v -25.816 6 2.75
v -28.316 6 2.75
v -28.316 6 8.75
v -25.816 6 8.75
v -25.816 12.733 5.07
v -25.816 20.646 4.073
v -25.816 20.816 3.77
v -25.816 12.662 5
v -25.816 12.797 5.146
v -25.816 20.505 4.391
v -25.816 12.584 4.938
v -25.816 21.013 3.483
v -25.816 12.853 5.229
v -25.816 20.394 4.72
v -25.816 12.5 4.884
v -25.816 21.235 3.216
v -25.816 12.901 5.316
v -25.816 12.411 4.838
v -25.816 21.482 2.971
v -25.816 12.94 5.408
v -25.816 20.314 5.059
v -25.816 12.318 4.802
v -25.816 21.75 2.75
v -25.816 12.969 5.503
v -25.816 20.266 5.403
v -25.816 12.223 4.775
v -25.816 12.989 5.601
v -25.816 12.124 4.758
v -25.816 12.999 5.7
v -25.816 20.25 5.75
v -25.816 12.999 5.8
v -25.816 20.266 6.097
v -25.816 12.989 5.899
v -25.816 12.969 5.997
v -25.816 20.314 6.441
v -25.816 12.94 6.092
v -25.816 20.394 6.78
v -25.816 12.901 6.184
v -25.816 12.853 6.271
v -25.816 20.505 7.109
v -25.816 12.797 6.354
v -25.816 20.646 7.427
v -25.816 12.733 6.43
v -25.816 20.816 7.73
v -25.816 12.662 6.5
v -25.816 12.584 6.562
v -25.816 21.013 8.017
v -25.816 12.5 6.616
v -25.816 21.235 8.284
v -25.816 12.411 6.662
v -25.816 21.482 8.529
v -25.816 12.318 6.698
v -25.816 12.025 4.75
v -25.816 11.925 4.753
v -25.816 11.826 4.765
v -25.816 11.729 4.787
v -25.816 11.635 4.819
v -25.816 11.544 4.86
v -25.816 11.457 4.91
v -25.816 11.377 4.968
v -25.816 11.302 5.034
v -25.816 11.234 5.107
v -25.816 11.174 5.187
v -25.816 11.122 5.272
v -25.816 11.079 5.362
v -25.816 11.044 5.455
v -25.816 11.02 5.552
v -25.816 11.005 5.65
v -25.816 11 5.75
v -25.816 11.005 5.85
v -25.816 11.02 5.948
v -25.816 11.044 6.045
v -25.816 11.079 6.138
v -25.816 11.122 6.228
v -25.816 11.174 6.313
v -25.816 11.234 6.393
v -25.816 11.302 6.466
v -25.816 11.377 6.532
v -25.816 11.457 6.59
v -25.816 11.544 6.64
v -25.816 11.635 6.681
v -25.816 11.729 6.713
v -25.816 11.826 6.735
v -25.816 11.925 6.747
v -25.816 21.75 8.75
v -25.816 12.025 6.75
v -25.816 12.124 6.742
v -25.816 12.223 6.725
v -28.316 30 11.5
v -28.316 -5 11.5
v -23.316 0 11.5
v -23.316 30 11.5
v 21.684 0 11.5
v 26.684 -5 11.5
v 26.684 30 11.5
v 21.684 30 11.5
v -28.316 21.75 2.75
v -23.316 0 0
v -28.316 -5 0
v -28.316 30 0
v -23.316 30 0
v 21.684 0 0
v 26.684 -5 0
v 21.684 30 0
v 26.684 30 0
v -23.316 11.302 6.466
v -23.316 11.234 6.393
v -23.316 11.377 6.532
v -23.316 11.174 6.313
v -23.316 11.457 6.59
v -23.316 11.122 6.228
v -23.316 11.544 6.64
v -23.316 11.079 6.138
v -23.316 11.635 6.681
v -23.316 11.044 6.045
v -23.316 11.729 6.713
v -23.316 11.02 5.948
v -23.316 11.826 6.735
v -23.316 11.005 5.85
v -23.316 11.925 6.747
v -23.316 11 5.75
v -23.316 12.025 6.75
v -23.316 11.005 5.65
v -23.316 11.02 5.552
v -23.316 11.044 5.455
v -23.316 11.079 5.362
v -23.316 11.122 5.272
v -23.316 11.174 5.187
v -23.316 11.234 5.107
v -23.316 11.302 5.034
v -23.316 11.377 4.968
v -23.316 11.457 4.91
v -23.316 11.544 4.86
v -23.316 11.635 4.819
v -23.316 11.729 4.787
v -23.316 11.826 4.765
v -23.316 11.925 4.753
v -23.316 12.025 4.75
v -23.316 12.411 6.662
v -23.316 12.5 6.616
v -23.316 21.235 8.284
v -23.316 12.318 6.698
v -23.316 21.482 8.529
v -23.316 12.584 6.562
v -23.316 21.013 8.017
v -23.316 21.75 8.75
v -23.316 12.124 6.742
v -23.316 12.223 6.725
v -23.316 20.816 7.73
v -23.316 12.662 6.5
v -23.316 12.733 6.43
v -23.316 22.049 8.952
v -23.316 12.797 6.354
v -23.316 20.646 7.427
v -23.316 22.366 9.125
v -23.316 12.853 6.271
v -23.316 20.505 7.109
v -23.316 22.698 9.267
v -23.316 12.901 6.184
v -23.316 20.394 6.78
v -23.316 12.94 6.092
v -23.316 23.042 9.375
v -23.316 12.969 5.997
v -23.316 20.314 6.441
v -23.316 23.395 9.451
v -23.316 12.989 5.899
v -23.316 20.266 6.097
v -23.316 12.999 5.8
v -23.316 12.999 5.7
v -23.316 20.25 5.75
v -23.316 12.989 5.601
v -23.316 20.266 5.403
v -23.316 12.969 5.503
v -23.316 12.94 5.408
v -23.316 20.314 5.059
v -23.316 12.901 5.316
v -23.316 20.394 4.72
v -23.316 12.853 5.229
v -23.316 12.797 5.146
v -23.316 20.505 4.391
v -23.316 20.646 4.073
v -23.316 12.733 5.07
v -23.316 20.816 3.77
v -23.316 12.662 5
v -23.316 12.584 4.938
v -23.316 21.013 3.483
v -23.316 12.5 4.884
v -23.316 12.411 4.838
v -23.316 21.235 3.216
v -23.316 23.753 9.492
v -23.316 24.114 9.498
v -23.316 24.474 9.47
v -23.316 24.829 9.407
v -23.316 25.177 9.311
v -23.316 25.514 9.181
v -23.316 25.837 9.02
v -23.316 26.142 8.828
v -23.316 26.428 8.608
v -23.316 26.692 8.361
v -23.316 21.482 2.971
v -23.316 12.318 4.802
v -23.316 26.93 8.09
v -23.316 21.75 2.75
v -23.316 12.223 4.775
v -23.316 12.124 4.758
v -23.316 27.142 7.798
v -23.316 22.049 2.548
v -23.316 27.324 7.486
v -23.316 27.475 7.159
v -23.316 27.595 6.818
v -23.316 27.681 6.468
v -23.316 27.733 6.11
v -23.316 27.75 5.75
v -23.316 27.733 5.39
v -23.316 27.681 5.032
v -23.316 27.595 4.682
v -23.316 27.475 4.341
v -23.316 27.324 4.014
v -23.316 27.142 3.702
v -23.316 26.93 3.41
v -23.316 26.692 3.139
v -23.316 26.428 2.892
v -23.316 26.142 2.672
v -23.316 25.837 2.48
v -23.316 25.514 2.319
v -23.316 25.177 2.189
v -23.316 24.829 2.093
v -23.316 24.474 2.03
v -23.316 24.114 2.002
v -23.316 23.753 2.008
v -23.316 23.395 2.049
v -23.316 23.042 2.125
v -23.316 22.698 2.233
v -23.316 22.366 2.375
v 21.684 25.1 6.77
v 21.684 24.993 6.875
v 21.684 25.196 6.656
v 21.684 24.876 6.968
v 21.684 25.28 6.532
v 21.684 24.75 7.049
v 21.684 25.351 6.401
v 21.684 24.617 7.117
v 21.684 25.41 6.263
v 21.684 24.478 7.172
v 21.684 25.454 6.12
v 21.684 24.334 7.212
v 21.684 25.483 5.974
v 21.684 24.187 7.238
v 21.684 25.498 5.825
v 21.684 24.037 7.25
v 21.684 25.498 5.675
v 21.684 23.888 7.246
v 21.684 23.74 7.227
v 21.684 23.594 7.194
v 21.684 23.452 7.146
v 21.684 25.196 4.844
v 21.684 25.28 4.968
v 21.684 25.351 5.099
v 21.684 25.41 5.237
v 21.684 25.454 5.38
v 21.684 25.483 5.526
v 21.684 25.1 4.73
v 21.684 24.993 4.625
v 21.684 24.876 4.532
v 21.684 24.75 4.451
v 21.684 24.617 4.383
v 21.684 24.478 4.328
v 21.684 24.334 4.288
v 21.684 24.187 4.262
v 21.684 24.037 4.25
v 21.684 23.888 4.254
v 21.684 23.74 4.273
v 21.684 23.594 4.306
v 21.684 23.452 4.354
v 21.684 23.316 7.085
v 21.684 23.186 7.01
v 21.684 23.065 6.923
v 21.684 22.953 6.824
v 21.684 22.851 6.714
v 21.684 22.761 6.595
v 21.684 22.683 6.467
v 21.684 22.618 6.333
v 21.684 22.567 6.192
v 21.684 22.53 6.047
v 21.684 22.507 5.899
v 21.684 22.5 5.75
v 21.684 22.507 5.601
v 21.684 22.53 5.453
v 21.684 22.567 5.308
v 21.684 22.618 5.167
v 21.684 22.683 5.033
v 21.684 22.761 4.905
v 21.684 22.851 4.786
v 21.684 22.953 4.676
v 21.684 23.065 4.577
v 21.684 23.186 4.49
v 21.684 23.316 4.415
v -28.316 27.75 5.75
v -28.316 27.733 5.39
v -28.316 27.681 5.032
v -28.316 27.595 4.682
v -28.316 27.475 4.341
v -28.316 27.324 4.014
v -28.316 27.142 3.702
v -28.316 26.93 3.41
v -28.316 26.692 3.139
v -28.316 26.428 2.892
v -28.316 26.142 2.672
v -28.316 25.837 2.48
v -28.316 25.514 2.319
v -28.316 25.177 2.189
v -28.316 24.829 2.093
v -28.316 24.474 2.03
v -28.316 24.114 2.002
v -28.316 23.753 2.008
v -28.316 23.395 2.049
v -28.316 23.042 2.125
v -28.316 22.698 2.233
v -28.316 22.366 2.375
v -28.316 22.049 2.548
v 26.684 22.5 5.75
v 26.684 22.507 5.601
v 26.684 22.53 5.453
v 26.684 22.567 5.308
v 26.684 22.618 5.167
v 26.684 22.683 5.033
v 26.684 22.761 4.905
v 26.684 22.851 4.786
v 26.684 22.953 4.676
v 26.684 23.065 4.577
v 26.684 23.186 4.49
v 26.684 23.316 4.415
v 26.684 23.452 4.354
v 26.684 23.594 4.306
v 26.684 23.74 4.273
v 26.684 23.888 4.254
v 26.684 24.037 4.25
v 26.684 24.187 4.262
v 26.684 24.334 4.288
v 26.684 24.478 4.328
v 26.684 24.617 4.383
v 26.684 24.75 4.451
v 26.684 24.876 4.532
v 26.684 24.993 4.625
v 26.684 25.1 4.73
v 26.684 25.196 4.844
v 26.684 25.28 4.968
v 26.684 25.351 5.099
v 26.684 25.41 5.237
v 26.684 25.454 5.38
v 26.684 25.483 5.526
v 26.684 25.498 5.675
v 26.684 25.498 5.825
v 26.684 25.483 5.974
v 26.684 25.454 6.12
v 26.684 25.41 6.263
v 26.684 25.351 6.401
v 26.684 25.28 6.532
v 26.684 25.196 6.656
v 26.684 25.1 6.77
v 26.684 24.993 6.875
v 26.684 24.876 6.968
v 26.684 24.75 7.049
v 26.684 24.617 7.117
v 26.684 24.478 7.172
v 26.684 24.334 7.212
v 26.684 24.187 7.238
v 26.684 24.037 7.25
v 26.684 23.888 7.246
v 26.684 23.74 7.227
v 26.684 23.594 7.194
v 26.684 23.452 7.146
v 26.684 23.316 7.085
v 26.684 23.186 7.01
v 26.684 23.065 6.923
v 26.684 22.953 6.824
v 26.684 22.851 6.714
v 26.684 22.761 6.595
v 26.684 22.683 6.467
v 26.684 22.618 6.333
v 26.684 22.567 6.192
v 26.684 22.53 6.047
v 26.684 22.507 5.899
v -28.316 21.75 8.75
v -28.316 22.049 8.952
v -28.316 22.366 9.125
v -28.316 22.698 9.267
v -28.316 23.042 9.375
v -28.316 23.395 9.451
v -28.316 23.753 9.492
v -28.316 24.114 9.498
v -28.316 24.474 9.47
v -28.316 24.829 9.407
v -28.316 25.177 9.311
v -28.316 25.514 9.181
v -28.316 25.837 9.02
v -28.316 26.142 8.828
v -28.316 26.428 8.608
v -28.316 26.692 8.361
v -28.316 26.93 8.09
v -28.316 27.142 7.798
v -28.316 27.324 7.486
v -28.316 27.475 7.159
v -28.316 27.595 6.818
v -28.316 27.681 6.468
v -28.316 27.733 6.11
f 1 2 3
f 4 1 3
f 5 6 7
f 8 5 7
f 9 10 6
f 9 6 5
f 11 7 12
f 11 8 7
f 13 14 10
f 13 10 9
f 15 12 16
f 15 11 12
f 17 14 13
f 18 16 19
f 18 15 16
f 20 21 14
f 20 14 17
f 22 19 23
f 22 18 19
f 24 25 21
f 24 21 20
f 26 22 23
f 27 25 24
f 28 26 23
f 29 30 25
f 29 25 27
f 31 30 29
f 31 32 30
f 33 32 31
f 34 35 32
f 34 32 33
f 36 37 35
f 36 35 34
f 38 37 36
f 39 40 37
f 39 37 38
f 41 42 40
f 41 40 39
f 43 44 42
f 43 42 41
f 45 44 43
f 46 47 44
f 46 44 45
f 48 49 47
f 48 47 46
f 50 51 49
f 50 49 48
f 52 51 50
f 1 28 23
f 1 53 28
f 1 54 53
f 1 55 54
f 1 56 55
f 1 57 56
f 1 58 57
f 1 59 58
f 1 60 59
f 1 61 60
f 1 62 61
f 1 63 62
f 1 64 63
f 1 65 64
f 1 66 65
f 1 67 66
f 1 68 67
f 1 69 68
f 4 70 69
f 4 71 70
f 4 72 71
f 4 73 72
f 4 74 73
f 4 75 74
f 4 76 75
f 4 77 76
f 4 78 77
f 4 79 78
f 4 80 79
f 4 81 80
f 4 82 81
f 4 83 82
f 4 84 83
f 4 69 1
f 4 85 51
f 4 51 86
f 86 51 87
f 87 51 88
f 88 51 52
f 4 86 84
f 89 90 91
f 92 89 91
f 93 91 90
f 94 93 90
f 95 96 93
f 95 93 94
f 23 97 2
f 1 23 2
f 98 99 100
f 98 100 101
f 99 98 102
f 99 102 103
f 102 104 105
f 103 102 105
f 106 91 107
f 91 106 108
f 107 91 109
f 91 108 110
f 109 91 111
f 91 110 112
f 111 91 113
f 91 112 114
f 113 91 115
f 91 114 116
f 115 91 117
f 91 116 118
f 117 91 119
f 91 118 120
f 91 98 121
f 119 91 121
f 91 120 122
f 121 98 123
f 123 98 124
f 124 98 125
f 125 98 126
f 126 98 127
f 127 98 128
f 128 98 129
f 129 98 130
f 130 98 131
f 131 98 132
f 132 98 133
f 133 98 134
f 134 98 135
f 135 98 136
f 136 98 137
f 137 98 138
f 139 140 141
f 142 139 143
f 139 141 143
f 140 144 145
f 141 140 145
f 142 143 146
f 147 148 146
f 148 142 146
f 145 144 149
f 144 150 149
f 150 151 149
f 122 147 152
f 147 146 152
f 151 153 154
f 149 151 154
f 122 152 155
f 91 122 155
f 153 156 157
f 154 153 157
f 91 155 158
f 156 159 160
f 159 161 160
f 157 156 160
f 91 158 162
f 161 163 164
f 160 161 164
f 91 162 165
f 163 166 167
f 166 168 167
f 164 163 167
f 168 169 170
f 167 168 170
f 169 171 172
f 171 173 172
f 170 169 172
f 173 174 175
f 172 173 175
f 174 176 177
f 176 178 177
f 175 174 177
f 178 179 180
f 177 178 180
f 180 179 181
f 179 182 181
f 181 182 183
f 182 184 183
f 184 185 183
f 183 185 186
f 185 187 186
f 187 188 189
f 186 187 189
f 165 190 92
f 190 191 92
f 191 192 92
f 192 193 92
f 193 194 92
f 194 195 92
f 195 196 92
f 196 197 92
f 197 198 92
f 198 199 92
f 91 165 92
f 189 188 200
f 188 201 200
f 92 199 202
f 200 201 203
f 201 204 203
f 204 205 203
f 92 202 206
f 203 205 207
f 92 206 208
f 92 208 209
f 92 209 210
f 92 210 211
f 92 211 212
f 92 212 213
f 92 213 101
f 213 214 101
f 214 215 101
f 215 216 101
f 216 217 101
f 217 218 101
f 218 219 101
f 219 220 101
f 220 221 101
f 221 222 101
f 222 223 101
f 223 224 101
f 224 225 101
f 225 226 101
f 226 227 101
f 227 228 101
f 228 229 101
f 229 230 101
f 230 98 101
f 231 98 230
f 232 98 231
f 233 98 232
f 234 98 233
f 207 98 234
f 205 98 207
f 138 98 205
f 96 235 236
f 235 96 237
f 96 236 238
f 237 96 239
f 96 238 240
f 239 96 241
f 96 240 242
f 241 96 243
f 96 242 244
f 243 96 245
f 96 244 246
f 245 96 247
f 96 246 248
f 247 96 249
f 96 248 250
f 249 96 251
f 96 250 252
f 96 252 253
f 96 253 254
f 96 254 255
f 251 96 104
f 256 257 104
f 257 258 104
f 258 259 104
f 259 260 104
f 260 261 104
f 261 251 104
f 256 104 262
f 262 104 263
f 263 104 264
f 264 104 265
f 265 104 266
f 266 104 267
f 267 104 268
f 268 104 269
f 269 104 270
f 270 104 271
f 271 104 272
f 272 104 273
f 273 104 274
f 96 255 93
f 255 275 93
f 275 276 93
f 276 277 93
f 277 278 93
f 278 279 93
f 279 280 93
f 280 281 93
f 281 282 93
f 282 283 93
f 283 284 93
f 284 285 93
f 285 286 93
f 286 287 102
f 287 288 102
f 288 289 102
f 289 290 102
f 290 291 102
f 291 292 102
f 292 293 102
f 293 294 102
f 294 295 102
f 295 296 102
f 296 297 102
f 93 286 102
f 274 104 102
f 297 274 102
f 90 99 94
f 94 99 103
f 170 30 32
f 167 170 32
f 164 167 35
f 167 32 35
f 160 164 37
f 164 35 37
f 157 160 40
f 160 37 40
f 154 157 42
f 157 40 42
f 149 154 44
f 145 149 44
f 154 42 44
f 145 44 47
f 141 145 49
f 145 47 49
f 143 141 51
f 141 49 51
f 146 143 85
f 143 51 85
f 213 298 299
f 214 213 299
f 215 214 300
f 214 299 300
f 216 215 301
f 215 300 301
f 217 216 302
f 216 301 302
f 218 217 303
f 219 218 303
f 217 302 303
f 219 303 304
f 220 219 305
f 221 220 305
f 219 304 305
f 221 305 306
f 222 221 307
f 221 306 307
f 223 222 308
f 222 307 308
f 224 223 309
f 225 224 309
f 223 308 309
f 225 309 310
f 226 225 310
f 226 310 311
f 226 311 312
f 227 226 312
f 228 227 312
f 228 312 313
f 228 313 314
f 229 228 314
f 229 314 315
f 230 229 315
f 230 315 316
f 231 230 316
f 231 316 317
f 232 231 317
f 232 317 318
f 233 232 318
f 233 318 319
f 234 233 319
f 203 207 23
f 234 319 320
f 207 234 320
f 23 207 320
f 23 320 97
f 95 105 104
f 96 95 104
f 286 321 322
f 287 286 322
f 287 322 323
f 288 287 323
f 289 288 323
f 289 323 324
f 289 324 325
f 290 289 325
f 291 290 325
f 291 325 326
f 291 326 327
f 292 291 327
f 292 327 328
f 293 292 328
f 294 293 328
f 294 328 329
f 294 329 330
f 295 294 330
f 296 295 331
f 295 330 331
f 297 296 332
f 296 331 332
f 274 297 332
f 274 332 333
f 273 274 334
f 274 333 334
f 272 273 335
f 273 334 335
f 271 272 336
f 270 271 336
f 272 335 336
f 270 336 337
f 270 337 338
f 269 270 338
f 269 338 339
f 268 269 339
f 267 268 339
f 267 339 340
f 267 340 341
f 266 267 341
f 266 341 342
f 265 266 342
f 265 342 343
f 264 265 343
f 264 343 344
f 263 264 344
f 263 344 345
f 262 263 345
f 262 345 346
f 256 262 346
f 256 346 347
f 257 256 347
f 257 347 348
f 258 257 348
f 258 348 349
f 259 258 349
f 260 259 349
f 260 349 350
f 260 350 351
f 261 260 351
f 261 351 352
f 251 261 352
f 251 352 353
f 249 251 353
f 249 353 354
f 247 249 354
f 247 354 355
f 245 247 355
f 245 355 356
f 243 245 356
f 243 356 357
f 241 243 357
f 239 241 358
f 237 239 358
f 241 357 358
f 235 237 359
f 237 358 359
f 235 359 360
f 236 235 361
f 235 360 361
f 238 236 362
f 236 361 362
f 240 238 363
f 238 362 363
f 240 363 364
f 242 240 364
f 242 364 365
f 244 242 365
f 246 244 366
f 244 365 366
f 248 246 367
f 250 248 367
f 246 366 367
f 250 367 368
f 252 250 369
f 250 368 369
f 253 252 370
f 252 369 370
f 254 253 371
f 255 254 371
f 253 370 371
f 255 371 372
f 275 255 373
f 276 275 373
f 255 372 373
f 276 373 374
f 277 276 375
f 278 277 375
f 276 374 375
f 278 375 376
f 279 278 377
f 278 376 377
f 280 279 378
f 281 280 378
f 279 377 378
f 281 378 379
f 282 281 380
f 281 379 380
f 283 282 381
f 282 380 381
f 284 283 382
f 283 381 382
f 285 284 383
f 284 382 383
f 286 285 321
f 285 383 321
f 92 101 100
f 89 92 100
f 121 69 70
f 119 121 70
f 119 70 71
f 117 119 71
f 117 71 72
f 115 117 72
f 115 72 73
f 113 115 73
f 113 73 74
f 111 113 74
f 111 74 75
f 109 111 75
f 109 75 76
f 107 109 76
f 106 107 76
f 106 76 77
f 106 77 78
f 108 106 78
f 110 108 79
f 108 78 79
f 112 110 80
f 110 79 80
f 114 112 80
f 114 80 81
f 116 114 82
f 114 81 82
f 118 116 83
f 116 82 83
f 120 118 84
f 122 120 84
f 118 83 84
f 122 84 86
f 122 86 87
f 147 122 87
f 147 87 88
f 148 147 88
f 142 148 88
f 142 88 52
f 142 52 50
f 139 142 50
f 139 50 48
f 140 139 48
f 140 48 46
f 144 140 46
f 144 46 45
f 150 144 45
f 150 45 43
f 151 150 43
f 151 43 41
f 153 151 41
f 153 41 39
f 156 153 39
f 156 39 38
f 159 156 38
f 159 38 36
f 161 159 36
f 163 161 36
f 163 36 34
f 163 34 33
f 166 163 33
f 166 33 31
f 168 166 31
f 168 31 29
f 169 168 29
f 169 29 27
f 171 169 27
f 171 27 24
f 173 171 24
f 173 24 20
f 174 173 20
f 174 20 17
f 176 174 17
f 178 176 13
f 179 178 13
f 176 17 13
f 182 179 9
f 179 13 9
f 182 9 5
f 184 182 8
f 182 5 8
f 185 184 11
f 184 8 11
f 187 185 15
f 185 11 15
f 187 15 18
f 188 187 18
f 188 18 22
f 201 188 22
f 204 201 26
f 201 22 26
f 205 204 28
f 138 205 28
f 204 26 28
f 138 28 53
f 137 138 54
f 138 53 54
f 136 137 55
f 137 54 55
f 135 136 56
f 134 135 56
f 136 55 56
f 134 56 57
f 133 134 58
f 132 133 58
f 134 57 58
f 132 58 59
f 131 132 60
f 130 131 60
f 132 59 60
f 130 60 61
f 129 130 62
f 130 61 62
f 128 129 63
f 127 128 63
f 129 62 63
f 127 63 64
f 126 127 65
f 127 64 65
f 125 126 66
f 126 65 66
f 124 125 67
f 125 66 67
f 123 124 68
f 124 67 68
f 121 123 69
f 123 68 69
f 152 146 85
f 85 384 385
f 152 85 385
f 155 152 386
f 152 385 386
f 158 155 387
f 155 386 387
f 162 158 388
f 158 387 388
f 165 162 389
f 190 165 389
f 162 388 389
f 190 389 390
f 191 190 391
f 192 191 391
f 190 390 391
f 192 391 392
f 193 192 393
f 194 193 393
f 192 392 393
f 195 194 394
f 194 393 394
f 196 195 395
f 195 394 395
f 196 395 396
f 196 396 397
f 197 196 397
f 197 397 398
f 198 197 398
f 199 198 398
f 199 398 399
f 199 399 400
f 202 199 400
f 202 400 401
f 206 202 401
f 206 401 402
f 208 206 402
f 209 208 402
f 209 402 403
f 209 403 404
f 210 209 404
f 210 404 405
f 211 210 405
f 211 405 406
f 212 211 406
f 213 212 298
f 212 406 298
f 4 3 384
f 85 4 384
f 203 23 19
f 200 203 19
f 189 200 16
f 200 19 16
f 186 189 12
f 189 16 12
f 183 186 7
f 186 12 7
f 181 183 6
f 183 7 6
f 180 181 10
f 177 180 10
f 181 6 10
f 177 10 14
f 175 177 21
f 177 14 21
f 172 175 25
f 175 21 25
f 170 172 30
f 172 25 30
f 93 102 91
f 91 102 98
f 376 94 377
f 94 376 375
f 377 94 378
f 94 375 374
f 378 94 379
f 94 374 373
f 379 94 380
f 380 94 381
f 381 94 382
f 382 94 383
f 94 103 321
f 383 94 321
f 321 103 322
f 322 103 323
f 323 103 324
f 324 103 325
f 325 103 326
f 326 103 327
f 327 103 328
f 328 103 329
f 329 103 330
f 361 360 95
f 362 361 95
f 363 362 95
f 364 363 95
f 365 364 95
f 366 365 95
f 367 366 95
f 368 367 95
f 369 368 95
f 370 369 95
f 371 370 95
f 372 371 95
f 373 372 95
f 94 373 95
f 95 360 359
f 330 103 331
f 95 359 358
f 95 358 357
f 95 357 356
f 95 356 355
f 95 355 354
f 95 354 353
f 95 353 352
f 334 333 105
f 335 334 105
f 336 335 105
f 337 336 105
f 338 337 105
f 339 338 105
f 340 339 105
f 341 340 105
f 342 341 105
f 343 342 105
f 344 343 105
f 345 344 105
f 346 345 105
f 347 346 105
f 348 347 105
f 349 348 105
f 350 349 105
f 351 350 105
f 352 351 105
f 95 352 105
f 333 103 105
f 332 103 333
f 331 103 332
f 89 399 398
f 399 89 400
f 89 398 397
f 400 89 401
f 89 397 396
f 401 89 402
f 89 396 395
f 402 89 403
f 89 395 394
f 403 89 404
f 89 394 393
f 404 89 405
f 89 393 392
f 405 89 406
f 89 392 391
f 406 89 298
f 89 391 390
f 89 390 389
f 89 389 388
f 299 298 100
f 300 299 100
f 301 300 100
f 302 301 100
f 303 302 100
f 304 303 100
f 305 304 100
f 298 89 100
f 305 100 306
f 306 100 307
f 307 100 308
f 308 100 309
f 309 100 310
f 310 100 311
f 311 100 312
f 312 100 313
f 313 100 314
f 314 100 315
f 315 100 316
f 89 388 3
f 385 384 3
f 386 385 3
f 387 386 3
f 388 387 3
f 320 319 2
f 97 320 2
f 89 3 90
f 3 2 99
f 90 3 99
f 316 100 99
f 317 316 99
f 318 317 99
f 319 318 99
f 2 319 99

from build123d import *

# Parameters (mm, degrees)
F1_DEPTH = 11.5
F3_DEPTH = 25
F4_DEPTH = 2.5
F6_DEPTH = 25


with BuildPart() as f1:
    # F0 (on Top) → F1 (new body)
    with BuildSketch(Plane.XY):
        Polygon((21.6838430613, 0), (-23.3161569387, 0), (-23.3161569387, 30), (-28.3161569387, 30), (-28.3161569387, -5), (26.6838430613, -5), (26.6838430613, 30), (21.6838430613, 30), align=None)
    extrude(amount=F1_DEPTH)

    # F2 (on face) → F3 (cut)
    with BuildSketch(Plane(origin=(-28.3161569387, 0, 0), x_dir=(0, -1, 0), z_dir=(-1, 0, 0))):
        with BuildLine():
            ThreePointArc((-21.75, 2.75), (-20.6458980338, 4.0729490169), (-20.25, 5.75))
            Line((-20.25, 5.75), (-24.0342449397, 5.75))
            Line((-24.0342449397, 5.75), (-24.0342449397, 2.75))
            Line((-24.0342449397, 2.75), (-21.75, 2.75))
        make_face()
        with BuildLine():
            Line((-24.0342449397, 5.75), (-20.25, 5.75))
            ThreePointArc((-20.25, 5.75), (-20.6458980338, 7.4270509831), (-21.75, 8.75))
            Line((-21.75, 8.75), (-24.0342449397, 8.75))
            Line((-24.0342449397, 8.75), (-24.0342449397, 5.75))
        make_face()
        with BuildLine():
            Line((-24.0342449397, 8.75), (-21.75, 8.75))
            ThreePointArc((-21.75, 8.75), (-25.6770509831, 9.1041019662), (-27.75, 5.75))
            Line((-27.75, 5.75), (-24.0342449397, 5.75))
            Line((-24.0342449397, 5.75), (-24.0342449397, 8.75))
        make_face()
        with BuildLine():
            ThreePointArc((-27.75, 5.75), (-25.6770509831, 2.3958980338), (-21.75, 2.75))
            Line((-21.75, 2.75), (-24.0342449397, 2.75))
            Line((-24.0342449397, 2.75), (-24.0342449397, 5.75))
            Line((-24.0342449397, 5.75), (-27.75, 5.75))
        make_face()
        with BuildLine():
            ThreePointArc((-13, 5.75), (-12, 4.75), (-11, 5.75))
            Line((-11, 5.75), (-13, 5.75))
        make_face()
        with BuildLine():
            Line((-13, 5.75), (-11, 5.75))
            ThreePointArc((-11, 5.75), (-12, 6.75), (-13, 5.75))
        make_face()
    extrude(amount=-F3_DEPTH, mode=Mode.SUBTRACT)

    # F2 (on face) → F4 (cut)
    with BuildSketch(Plane(origin=(-28.3161569387, 0, 0), x_dir=(0, -1, 0), z_dir=(-1, 0, 0))):
        with BuildLine():
            Line((-6, 5.75), (-11, 5.75))
            ThreePointArc((-11, 5.75), (-12, 4.75), (-13, 5.75))
            Line((-13, 5.75), (-20.25, 5.75))
            ThreePointArc((-20.25, 5.75), (-20.6458980338, 4.0729490169), (-21.75, 2.75))
            Line((-21.75, 2.75), (-6, 2.75))
            Line((-6, 2.75), (-6, 5.75))
        make_face()
        with BuildLine():
            ThreePointArc((-13, 5.75), (-12, 6.75), (-11, 5.75))
            Line((-11, 5.75), (-6, 5.75))
            Line((-6, 5.75), (-6, 8.75))
            Line((-6, 8.75), (-21.75, 8.75))
            ThreePointArc((-21.75, 8.75), (-20.6458980338, 7.4270509831), (-20.25, 5.75))
            Line((-20.25, 5.75), (-13, 5.75))
        make_face()
    extrude(amount=-F4_DEPTH, mode=Mode.SUBTRACT)

    # F5 (on face) → F6 (cut)
    with BuildSketch(Plane.YZ.offset(26.6838430613)):
        with BuildLine():
            Line((22.5, 5.75), (25.5, 5.75))
            ThreePointArc((25.5, 5.75), (24, 7.25), (22.5, 5.75))
        make_face()
        with BuildLine():
            ThreePointArc((22.5, 5.75), (24, 4.25), (25.5, 5.75))
            Line((25.5, 5.75), (22.5, 5.75))
        make_face()
    extrude(amount=-F6_DEPTH, mode=Mode.SUBTRACT)


solid = f1.part
